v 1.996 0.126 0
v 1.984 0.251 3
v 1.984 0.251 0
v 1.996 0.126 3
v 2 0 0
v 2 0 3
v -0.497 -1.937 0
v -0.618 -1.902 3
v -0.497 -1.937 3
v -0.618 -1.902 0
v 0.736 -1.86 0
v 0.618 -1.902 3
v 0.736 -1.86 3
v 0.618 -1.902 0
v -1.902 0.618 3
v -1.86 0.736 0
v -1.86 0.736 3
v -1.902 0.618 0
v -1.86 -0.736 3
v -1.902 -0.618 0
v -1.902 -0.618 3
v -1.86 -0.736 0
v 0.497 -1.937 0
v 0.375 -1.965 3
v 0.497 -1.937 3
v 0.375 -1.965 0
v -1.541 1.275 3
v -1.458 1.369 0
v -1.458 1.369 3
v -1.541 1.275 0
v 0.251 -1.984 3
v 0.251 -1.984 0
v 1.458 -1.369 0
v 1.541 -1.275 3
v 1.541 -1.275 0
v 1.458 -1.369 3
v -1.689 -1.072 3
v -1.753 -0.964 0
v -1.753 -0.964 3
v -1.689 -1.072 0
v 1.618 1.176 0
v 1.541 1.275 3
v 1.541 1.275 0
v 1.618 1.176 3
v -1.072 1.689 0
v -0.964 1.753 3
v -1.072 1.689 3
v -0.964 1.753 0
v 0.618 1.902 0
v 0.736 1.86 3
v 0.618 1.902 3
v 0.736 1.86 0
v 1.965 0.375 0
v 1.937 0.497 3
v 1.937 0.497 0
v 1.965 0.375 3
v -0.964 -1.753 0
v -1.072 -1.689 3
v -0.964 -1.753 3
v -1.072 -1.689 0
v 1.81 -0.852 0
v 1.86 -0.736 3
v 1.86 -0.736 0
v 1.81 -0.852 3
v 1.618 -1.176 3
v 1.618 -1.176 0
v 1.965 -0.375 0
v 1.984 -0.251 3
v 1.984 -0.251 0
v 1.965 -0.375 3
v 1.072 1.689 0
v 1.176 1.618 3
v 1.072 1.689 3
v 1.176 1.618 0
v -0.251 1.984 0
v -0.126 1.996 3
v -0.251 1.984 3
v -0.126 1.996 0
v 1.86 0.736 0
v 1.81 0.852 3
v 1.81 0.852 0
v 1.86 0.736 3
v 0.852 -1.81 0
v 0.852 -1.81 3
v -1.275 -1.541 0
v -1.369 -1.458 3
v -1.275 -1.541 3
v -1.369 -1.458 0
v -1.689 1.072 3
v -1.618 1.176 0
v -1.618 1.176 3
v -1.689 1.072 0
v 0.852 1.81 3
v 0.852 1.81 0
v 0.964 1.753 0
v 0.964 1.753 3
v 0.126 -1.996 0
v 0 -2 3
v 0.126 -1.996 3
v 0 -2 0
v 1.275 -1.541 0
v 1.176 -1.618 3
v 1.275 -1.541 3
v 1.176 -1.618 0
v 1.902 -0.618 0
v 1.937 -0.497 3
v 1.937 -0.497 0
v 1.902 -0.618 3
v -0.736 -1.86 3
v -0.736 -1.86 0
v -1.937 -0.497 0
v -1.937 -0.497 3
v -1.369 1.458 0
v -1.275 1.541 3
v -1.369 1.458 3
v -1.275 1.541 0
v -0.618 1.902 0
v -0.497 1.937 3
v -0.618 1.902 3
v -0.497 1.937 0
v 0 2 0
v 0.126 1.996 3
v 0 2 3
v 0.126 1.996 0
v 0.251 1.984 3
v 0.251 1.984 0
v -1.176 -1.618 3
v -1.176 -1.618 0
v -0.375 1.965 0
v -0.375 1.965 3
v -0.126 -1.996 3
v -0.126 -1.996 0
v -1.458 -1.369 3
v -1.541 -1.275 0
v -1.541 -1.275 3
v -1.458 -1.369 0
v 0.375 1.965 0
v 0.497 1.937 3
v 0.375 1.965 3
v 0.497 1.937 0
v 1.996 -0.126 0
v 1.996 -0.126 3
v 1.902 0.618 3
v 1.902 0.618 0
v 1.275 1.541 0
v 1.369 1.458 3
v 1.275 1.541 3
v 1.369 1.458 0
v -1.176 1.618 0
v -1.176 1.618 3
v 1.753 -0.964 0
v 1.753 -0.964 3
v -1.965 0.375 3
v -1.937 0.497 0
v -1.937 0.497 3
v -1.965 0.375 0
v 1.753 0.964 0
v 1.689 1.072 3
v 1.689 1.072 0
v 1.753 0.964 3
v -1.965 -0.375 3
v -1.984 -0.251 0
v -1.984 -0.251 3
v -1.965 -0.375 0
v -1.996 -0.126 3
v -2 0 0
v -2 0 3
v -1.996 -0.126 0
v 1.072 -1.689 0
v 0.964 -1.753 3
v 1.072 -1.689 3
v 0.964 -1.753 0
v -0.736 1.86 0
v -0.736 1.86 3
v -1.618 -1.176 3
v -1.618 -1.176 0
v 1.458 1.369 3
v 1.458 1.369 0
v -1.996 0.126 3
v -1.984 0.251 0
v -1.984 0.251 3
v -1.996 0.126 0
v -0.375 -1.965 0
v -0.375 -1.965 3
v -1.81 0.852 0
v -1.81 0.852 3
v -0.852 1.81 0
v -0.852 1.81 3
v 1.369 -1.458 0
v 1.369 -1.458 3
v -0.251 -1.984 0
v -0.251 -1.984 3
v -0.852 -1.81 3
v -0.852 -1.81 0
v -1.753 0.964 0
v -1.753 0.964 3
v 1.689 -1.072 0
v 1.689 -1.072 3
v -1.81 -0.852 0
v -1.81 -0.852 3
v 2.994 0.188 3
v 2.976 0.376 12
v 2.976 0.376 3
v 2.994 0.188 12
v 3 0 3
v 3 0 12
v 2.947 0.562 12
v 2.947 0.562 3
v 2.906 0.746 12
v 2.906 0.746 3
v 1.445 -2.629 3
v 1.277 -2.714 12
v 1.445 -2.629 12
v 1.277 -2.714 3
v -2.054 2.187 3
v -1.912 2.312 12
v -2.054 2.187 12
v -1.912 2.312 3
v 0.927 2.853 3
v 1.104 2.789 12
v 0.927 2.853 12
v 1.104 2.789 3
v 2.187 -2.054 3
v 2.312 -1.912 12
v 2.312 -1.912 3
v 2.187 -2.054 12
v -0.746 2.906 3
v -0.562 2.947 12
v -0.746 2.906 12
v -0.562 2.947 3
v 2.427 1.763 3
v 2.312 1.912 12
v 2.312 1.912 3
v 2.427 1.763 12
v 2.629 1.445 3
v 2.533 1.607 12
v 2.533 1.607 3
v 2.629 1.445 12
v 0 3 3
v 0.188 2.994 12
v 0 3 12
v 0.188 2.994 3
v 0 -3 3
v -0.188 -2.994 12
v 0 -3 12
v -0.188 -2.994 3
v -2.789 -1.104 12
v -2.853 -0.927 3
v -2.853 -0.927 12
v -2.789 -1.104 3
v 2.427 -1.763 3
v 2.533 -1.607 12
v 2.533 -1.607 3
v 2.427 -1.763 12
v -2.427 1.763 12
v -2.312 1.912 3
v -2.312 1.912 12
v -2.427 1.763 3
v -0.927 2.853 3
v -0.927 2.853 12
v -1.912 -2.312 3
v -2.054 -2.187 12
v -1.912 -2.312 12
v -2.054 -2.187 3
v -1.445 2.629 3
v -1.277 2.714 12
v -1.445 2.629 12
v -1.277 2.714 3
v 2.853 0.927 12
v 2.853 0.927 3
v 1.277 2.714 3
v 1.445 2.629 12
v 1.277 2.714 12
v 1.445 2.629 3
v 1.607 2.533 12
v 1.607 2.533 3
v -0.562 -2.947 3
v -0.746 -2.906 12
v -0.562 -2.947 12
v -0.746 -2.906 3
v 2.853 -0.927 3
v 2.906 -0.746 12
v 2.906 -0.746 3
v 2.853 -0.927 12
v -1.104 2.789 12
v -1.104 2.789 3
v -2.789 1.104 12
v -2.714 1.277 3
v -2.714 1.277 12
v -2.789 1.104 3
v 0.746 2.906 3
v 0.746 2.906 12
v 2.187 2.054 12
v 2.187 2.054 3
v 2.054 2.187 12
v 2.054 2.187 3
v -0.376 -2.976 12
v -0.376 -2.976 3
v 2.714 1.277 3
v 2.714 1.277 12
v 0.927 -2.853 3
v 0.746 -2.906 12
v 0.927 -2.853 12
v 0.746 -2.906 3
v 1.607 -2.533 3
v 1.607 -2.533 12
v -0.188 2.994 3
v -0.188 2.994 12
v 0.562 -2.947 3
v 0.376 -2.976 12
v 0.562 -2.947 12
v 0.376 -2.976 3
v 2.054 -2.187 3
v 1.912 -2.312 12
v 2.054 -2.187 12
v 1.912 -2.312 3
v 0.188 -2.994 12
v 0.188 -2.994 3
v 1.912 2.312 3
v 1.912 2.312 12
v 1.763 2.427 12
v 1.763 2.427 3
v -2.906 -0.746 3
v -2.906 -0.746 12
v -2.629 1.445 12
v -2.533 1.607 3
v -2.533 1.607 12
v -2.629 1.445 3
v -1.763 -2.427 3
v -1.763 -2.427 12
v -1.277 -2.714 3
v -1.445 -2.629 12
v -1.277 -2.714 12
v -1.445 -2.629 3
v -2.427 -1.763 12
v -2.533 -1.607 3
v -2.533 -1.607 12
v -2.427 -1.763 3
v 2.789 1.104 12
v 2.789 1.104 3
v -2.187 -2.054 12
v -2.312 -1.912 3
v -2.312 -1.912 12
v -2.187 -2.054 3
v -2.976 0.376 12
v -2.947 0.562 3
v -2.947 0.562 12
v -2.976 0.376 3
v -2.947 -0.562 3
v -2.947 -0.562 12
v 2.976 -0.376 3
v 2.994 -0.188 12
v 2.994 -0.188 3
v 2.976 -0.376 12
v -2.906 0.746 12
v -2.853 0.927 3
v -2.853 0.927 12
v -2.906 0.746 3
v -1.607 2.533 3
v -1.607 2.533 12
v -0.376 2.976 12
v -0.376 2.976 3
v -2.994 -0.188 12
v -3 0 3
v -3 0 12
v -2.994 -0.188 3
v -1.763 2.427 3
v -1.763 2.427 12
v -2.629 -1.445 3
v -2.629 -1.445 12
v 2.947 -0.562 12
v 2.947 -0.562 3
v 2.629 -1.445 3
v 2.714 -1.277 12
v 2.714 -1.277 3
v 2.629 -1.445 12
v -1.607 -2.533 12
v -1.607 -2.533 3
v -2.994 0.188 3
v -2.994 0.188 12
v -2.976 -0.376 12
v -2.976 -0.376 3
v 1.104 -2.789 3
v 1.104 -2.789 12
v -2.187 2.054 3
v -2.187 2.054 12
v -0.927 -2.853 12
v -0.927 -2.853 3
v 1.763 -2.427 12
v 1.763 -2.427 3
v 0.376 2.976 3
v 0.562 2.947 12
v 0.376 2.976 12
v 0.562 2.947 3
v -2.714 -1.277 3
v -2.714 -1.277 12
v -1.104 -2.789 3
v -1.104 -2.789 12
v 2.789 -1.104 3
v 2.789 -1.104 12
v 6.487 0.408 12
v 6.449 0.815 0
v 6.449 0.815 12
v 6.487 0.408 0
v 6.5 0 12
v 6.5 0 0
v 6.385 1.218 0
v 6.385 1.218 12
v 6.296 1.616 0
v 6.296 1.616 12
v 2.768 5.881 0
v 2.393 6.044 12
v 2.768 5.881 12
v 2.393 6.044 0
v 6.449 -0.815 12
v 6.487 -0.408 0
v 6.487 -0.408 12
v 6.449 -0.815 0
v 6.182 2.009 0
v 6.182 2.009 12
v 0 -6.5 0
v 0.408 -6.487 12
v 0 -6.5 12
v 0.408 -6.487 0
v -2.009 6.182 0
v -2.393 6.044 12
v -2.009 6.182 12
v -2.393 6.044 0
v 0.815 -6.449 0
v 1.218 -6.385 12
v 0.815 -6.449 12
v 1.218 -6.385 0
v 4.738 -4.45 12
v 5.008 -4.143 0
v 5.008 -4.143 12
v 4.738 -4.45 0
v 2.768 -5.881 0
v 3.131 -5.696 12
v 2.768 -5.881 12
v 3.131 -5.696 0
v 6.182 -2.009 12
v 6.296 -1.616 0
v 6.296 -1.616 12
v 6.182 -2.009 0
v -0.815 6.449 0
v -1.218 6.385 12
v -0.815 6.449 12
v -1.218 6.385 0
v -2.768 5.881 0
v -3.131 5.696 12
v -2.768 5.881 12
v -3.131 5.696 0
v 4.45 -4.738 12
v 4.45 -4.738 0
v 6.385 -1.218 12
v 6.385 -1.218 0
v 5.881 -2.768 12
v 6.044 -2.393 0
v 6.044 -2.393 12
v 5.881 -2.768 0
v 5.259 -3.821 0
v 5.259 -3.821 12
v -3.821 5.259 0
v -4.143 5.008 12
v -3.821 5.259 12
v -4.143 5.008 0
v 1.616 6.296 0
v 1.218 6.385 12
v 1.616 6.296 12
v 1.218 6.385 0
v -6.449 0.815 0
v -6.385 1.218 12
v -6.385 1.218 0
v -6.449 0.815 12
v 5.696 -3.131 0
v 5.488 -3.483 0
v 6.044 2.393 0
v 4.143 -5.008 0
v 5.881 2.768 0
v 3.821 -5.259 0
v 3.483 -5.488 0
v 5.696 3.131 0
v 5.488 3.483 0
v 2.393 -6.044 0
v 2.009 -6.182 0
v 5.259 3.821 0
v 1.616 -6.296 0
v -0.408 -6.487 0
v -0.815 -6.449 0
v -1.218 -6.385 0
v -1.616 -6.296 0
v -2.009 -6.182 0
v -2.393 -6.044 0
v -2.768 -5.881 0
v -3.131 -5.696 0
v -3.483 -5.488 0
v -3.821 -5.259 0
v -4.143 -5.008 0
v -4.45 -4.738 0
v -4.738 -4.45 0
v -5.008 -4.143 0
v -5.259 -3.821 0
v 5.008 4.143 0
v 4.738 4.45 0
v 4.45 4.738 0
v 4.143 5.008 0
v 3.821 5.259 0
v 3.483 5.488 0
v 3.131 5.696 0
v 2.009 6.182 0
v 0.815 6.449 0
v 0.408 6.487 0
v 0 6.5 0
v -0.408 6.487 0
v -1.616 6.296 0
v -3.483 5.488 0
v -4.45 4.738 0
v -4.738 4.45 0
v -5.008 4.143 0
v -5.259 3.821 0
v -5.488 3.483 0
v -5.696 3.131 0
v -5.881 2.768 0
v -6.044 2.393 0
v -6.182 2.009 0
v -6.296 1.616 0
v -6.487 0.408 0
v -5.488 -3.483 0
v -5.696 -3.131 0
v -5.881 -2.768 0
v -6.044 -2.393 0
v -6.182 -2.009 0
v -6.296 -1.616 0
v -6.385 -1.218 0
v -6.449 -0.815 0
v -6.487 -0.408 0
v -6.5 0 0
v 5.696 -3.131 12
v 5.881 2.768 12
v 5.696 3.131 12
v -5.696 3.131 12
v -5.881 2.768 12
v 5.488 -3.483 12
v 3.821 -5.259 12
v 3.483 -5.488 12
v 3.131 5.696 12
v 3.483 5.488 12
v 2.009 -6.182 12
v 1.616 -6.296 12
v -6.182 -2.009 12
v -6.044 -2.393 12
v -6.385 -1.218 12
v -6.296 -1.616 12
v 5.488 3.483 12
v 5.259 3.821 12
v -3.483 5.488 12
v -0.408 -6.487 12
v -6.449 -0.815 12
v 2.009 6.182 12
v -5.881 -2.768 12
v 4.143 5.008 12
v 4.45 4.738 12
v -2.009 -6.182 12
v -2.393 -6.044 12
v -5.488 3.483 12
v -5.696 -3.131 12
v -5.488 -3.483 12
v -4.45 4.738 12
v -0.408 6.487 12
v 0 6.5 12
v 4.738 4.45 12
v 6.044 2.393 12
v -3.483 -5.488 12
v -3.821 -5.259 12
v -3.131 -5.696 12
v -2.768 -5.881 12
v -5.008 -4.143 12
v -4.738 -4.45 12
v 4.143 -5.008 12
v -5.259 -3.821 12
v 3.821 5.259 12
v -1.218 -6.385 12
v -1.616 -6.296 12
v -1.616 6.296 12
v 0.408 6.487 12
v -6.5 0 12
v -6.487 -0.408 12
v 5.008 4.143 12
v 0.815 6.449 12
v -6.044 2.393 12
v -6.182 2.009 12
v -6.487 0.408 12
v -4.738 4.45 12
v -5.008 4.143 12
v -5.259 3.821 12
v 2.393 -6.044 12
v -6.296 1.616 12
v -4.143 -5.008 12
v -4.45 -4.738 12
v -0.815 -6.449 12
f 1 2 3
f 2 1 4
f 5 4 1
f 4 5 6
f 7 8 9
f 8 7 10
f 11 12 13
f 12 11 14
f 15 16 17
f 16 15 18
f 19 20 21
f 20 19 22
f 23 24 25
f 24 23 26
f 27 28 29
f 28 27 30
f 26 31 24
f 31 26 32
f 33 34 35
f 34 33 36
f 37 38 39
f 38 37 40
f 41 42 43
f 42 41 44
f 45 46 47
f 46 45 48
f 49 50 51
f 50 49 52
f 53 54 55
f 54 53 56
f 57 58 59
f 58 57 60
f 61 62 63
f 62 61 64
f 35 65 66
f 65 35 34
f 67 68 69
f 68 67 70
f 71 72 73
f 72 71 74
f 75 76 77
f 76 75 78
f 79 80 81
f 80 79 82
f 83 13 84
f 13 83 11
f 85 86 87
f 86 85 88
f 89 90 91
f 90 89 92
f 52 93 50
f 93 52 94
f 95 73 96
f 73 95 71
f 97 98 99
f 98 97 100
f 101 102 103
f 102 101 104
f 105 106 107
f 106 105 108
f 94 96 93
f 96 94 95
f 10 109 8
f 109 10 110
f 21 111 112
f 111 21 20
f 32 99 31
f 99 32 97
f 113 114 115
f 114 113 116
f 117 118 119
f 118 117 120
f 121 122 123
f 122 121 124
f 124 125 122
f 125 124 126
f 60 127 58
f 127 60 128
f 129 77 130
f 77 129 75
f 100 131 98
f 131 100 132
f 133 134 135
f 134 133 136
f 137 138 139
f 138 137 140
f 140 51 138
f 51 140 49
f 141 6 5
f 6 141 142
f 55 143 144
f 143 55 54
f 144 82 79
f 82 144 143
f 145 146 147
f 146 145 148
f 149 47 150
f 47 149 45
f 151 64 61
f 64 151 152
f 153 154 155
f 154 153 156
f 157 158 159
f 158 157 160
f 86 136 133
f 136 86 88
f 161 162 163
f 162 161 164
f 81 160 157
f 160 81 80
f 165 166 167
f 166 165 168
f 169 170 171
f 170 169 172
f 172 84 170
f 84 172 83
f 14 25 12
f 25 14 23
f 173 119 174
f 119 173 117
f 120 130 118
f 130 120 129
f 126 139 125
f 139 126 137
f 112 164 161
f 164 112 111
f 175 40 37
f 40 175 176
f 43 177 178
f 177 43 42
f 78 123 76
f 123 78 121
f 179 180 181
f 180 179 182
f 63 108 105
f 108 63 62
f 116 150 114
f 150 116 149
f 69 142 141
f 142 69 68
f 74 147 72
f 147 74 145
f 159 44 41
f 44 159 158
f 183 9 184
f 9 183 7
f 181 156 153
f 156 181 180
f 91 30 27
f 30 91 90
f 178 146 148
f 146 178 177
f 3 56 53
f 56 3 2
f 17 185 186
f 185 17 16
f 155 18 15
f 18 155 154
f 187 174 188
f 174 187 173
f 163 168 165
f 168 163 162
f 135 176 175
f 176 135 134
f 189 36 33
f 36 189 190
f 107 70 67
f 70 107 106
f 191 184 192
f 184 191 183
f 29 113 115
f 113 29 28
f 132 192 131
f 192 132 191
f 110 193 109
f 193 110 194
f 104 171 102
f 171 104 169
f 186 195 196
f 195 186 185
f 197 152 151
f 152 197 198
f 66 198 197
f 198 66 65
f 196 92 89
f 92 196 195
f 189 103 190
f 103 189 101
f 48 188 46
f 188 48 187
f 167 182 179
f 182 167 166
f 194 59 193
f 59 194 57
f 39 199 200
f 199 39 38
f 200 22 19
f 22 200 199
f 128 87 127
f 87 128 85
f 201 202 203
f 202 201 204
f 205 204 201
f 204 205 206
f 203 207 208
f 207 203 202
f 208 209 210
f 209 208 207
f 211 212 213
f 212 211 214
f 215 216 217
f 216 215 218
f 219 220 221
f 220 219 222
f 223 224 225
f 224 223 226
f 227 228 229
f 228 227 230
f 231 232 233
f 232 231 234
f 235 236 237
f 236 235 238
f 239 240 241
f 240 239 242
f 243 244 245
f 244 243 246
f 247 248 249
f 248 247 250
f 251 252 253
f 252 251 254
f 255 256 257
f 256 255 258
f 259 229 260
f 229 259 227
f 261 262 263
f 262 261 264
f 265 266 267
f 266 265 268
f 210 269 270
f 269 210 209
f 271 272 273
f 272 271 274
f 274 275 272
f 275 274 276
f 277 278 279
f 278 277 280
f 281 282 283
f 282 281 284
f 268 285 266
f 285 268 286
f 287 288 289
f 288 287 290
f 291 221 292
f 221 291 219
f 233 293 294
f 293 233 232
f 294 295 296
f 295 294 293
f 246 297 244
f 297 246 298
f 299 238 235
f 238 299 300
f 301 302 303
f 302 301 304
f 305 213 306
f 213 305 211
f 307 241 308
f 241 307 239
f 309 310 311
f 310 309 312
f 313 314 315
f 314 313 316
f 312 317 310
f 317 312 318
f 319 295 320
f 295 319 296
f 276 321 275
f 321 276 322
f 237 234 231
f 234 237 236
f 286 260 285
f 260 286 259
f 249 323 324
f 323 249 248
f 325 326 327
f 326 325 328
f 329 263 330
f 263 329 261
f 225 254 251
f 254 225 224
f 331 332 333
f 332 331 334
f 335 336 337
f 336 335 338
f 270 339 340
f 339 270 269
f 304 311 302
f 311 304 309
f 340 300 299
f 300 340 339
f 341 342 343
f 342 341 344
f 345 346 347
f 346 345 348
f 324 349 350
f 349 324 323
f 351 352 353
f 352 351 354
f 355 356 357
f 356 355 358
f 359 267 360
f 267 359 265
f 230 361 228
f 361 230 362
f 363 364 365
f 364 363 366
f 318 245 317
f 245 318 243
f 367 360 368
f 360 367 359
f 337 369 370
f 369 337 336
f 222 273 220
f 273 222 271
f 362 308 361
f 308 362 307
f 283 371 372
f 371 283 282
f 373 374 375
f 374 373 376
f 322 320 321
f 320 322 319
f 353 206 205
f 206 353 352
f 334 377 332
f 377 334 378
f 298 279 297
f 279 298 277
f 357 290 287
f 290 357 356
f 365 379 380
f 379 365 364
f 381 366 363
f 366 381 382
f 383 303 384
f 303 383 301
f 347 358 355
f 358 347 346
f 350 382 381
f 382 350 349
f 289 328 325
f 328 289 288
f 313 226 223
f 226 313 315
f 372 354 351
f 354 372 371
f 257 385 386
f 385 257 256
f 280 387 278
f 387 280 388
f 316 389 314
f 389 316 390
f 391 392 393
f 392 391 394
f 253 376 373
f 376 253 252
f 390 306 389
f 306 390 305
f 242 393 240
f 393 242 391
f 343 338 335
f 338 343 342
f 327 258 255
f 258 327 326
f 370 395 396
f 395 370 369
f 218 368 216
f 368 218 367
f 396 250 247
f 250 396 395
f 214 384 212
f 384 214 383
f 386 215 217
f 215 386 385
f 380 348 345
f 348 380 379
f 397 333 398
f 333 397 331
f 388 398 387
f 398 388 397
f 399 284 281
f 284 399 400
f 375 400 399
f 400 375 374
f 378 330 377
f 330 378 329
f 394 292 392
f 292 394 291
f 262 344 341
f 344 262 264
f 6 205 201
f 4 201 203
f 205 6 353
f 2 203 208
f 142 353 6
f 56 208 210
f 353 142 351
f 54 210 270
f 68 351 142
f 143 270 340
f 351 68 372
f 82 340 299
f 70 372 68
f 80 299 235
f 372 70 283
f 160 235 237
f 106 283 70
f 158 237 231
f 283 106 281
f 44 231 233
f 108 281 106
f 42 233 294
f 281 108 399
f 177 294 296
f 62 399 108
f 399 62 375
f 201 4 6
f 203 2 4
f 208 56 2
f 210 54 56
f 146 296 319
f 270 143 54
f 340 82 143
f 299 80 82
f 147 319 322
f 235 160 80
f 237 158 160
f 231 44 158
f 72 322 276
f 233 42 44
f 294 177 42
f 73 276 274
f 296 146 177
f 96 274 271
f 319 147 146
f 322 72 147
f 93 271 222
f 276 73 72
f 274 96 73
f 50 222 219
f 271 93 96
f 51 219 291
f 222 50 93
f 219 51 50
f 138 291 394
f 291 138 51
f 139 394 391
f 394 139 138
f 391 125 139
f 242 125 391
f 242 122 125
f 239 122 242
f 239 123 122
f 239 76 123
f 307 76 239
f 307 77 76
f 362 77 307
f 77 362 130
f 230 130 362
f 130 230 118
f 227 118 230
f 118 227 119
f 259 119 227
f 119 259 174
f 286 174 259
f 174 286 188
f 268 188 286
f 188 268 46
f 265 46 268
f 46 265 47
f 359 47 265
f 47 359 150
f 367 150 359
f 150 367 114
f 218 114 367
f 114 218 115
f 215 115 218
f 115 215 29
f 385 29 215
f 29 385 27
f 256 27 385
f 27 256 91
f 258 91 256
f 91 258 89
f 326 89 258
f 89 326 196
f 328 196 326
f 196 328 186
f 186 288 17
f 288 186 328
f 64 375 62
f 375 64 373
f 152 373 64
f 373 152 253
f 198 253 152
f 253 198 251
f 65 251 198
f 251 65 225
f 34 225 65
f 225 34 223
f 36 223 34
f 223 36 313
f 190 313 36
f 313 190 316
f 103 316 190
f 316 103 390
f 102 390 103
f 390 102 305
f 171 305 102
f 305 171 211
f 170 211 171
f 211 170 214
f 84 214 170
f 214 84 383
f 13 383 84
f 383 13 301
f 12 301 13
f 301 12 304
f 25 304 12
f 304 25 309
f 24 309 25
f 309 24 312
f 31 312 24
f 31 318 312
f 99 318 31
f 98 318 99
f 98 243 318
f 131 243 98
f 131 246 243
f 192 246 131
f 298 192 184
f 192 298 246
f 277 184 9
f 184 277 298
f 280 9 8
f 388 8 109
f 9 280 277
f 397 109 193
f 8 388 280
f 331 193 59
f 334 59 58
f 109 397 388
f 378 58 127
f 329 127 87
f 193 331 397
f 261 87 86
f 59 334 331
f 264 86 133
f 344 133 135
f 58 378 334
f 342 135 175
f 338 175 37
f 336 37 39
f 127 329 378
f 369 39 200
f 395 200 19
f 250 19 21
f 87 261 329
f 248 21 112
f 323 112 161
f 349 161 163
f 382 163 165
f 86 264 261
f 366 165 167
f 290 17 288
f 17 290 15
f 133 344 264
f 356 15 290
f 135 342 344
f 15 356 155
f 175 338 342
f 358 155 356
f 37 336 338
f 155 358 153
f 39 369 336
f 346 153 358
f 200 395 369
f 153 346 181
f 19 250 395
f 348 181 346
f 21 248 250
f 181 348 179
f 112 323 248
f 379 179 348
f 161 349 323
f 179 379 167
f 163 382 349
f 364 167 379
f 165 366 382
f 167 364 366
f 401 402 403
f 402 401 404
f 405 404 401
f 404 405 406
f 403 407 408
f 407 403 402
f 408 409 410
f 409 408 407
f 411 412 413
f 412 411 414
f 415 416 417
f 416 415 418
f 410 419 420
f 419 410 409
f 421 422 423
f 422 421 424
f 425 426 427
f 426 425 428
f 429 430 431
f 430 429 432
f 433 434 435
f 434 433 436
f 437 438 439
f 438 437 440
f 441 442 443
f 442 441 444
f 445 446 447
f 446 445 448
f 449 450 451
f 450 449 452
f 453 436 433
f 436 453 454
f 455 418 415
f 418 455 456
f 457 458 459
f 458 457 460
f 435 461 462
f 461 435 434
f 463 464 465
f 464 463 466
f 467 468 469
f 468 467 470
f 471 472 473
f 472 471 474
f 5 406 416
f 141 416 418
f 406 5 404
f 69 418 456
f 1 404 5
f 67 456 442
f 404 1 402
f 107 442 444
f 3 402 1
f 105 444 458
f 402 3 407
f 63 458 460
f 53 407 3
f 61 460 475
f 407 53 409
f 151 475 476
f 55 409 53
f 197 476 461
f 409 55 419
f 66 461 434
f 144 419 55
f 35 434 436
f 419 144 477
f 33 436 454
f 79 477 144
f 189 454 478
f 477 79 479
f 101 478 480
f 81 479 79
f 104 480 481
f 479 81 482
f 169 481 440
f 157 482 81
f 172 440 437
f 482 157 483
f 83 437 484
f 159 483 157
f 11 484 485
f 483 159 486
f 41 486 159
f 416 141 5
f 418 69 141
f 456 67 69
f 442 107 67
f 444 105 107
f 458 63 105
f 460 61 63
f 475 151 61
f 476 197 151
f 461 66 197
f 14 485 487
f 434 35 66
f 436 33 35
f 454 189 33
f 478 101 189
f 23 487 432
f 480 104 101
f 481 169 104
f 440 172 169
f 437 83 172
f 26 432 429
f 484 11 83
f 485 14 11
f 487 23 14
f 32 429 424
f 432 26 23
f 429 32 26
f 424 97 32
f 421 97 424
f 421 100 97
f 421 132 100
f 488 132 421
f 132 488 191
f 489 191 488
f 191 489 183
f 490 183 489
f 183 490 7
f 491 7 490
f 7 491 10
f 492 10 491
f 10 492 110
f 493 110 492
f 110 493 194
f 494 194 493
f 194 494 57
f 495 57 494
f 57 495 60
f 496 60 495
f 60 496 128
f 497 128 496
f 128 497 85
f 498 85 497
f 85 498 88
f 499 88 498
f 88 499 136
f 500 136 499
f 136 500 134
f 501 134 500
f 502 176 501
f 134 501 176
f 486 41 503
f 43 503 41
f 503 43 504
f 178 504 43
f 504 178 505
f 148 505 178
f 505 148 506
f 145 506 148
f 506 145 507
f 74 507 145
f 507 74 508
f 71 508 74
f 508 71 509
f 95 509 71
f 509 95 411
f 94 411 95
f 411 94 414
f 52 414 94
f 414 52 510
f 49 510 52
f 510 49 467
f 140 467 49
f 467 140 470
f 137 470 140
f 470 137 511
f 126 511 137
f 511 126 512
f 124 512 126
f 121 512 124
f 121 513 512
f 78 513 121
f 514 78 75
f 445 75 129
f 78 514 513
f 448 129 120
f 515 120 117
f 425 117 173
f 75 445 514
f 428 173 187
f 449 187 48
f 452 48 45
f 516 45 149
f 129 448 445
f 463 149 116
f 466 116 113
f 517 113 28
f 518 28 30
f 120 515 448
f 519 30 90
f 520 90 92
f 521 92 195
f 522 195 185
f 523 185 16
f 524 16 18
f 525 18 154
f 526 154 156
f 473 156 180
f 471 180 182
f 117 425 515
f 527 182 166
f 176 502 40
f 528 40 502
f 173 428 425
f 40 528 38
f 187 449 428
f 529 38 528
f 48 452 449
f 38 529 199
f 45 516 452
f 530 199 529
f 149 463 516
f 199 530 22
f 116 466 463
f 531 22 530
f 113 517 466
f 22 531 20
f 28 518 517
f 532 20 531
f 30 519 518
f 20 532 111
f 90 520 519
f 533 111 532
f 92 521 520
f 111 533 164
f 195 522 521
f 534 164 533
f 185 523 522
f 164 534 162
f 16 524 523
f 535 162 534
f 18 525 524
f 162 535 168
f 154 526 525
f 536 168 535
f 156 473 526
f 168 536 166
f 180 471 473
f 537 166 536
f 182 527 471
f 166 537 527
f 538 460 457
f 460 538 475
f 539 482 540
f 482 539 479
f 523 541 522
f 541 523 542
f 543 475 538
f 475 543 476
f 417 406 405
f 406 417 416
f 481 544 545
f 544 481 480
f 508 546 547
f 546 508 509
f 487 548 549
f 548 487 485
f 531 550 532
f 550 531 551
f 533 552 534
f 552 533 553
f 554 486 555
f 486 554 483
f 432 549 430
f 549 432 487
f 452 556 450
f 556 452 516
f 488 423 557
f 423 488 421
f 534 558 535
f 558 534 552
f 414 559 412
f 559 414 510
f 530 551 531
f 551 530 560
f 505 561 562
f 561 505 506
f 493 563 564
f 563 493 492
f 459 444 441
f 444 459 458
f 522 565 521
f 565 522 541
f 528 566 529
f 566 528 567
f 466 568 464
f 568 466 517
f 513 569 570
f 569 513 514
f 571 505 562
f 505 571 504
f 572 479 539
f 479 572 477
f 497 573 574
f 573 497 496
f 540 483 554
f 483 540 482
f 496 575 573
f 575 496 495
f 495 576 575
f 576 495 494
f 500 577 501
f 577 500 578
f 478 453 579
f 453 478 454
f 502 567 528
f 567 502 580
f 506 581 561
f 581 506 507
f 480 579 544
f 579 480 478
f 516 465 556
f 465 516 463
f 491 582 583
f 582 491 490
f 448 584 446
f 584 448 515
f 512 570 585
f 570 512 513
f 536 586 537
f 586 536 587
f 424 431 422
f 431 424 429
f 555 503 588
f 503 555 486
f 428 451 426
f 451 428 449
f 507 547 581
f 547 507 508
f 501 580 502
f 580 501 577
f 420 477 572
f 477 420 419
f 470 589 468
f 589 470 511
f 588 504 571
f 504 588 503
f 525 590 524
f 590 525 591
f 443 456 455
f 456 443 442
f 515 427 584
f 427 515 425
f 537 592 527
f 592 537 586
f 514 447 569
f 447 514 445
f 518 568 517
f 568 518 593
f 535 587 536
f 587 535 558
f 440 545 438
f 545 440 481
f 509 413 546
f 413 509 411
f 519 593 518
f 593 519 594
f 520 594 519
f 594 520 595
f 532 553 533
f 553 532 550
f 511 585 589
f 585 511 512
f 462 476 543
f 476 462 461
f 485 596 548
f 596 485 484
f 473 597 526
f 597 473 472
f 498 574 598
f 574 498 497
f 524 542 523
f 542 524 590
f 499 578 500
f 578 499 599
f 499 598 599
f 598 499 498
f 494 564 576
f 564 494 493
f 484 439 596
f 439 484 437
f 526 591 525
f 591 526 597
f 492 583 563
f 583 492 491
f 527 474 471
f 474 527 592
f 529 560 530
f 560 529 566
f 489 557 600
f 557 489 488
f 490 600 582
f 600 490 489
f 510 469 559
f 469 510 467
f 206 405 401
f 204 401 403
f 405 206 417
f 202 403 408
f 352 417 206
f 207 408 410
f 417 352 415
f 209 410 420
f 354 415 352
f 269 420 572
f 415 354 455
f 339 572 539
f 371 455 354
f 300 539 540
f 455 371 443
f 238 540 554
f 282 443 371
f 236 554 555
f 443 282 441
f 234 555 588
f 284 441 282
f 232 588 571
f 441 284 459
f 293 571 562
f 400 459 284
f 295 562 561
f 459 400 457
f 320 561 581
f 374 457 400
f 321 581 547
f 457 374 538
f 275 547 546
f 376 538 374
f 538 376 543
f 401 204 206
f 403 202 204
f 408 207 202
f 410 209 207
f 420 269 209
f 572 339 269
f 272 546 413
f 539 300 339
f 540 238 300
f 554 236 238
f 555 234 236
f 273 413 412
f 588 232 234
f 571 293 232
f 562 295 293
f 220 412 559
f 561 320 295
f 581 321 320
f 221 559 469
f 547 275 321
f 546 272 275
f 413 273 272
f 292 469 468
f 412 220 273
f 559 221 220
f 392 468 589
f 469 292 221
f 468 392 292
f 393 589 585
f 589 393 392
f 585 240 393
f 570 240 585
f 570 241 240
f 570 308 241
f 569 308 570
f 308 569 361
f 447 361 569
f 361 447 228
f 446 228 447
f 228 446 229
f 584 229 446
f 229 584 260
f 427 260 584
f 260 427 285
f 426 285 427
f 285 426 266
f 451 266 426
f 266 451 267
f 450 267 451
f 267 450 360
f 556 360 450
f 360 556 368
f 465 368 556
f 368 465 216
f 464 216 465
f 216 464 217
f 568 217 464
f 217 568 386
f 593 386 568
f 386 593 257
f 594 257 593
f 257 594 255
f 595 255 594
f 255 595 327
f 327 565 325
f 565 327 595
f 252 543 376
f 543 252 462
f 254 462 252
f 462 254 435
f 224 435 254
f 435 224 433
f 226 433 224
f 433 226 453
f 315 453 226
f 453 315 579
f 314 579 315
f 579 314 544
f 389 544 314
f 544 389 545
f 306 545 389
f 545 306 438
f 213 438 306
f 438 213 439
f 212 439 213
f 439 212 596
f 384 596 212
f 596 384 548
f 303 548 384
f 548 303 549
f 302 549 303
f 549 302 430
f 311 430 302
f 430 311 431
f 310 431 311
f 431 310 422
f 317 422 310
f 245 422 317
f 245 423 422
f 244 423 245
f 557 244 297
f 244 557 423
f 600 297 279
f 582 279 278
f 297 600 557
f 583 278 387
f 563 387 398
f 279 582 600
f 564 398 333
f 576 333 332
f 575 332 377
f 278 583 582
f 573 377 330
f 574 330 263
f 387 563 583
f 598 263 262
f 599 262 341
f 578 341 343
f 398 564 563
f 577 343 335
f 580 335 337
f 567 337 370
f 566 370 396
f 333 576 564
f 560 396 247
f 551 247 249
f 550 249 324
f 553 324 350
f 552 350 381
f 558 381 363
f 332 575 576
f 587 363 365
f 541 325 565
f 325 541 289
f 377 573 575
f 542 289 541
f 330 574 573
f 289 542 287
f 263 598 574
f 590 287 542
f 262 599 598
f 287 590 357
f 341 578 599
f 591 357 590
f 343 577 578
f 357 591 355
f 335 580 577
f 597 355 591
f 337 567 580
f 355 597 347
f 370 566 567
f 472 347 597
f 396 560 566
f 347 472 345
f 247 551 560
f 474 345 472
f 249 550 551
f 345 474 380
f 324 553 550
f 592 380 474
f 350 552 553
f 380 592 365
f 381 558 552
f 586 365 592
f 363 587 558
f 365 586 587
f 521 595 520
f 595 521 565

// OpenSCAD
difference(){
	union(){

        translate([0,0,0]){
            rotate([0,0,0]){
                cylinder(h=12, r=6.5, $fn=100, center=false);
            }
        }            

	}
	union() {

        translate([0,0,-10]){
            rotate([0,0,0]){
                cylinder(h=200, r=2, $fn=100, center=false);
            }
        }            
        translate([0,0,3]){
            rotate([0,0,0]){
                cylinder(h=200, r=3, $fn=100, center=false);
            }
        }            


	}
}
